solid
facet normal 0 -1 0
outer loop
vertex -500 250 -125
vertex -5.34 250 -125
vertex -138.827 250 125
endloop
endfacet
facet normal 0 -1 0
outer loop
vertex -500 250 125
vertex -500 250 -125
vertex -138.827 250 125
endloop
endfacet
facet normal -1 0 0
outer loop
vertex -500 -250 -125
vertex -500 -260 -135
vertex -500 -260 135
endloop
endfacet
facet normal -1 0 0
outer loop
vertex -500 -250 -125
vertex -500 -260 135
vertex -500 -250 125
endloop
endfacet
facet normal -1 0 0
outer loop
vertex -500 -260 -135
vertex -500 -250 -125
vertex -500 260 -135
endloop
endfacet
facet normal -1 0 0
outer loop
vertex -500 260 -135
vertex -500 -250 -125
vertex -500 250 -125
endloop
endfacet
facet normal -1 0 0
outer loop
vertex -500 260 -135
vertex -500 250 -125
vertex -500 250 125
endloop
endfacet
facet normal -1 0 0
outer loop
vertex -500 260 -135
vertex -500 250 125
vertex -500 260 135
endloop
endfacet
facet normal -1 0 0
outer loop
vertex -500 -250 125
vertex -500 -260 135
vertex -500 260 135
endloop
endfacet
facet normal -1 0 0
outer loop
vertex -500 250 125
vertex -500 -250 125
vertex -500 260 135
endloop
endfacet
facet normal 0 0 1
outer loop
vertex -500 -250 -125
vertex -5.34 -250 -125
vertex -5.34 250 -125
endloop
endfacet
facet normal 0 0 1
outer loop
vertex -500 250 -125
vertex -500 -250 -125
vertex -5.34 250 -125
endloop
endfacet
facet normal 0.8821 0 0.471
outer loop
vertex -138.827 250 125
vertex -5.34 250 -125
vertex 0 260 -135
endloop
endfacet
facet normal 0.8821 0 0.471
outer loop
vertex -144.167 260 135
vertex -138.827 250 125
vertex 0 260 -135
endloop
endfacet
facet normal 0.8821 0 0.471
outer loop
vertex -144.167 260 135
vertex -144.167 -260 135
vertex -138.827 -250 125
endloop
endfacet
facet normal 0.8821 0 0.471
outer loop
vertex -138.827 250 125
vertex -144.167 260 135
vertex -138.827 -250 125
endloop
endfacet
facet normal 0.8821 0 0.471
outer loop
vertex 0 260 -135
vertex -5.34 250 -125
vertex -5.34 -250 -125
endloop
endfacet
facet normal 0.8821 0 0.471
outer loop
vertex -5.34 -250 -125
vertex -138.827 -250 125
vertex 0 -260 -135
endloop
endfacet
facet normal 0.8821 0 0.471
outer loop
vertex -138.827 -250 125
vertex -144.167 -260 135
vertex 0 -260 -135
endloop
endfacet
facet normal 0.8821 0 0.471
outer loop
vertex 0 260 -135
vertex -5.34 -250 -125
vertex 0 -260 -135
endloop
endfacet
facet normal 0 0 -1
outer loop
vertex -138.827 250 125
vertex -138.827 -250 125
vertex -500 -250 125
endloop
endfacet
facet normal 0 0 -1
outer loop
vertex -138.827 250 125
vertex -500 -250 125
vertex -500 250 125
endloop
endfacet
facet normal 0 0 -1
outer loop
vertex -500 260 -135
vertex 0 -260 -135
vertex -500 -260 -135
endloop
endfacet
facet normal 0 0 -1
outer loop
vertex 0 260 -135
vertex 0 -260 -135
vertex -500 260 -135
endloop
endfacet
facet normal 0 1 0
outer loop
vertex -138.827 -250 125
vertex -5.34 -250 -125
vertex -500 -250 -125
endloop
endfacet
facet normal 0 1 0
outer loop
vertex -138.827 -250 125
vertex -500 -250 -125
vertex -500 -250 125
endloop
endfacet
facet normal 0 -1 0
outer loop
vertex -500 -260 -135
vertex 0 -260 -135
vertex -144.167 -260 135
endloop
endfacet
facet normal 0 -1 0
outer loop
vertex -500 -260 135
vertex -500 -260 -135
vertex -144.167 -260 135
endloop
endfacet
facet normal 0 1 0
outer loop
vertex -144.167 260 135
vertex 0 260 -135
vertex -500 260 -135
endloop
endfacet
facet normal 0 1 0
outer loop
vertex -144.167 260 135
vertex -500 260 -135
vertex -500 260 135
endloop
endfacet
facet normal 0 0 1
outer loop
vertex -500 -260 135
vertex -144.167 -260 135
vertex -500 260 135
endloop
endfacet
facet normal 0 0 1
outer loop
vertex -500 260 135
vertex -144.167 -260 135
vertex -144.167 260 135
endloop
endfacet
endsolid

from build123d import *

# Parameters (mm, degrees)
F0_W     = 520
F0_H     = 270
F1_DEPTH = 500
F2_W     = 500
F2_H     = 250
F3_DEPTH = 500
F5_DEPTH = 600


with BuildPart() as f1:
    # F0 (on Right) → F1 (new body)
    with BuildSketch(Plane.YZ):
        Rectangle(F0_W, F0_H)
    extrude(amount=-F1_DEPTH)

    # F2 (on face) → F3 (cut)
    with BuildSketch(Plane.YZ):
        Rectangle(F2_W, F2_H)
    extrude(amount=-F3_DEPTH, mode=Mode.SUBTRACT)

    # F4 (on face) → F5 (cut)
    with BuildSketch(Plane.XZ.offset(260)):
        Polygon((-144.166574, 135), (0, -135), (0, 135), align=None)
    extrude(amount=-F5_DEPTH, mode=Mode.SUBTRACT)


solid = f1.part
